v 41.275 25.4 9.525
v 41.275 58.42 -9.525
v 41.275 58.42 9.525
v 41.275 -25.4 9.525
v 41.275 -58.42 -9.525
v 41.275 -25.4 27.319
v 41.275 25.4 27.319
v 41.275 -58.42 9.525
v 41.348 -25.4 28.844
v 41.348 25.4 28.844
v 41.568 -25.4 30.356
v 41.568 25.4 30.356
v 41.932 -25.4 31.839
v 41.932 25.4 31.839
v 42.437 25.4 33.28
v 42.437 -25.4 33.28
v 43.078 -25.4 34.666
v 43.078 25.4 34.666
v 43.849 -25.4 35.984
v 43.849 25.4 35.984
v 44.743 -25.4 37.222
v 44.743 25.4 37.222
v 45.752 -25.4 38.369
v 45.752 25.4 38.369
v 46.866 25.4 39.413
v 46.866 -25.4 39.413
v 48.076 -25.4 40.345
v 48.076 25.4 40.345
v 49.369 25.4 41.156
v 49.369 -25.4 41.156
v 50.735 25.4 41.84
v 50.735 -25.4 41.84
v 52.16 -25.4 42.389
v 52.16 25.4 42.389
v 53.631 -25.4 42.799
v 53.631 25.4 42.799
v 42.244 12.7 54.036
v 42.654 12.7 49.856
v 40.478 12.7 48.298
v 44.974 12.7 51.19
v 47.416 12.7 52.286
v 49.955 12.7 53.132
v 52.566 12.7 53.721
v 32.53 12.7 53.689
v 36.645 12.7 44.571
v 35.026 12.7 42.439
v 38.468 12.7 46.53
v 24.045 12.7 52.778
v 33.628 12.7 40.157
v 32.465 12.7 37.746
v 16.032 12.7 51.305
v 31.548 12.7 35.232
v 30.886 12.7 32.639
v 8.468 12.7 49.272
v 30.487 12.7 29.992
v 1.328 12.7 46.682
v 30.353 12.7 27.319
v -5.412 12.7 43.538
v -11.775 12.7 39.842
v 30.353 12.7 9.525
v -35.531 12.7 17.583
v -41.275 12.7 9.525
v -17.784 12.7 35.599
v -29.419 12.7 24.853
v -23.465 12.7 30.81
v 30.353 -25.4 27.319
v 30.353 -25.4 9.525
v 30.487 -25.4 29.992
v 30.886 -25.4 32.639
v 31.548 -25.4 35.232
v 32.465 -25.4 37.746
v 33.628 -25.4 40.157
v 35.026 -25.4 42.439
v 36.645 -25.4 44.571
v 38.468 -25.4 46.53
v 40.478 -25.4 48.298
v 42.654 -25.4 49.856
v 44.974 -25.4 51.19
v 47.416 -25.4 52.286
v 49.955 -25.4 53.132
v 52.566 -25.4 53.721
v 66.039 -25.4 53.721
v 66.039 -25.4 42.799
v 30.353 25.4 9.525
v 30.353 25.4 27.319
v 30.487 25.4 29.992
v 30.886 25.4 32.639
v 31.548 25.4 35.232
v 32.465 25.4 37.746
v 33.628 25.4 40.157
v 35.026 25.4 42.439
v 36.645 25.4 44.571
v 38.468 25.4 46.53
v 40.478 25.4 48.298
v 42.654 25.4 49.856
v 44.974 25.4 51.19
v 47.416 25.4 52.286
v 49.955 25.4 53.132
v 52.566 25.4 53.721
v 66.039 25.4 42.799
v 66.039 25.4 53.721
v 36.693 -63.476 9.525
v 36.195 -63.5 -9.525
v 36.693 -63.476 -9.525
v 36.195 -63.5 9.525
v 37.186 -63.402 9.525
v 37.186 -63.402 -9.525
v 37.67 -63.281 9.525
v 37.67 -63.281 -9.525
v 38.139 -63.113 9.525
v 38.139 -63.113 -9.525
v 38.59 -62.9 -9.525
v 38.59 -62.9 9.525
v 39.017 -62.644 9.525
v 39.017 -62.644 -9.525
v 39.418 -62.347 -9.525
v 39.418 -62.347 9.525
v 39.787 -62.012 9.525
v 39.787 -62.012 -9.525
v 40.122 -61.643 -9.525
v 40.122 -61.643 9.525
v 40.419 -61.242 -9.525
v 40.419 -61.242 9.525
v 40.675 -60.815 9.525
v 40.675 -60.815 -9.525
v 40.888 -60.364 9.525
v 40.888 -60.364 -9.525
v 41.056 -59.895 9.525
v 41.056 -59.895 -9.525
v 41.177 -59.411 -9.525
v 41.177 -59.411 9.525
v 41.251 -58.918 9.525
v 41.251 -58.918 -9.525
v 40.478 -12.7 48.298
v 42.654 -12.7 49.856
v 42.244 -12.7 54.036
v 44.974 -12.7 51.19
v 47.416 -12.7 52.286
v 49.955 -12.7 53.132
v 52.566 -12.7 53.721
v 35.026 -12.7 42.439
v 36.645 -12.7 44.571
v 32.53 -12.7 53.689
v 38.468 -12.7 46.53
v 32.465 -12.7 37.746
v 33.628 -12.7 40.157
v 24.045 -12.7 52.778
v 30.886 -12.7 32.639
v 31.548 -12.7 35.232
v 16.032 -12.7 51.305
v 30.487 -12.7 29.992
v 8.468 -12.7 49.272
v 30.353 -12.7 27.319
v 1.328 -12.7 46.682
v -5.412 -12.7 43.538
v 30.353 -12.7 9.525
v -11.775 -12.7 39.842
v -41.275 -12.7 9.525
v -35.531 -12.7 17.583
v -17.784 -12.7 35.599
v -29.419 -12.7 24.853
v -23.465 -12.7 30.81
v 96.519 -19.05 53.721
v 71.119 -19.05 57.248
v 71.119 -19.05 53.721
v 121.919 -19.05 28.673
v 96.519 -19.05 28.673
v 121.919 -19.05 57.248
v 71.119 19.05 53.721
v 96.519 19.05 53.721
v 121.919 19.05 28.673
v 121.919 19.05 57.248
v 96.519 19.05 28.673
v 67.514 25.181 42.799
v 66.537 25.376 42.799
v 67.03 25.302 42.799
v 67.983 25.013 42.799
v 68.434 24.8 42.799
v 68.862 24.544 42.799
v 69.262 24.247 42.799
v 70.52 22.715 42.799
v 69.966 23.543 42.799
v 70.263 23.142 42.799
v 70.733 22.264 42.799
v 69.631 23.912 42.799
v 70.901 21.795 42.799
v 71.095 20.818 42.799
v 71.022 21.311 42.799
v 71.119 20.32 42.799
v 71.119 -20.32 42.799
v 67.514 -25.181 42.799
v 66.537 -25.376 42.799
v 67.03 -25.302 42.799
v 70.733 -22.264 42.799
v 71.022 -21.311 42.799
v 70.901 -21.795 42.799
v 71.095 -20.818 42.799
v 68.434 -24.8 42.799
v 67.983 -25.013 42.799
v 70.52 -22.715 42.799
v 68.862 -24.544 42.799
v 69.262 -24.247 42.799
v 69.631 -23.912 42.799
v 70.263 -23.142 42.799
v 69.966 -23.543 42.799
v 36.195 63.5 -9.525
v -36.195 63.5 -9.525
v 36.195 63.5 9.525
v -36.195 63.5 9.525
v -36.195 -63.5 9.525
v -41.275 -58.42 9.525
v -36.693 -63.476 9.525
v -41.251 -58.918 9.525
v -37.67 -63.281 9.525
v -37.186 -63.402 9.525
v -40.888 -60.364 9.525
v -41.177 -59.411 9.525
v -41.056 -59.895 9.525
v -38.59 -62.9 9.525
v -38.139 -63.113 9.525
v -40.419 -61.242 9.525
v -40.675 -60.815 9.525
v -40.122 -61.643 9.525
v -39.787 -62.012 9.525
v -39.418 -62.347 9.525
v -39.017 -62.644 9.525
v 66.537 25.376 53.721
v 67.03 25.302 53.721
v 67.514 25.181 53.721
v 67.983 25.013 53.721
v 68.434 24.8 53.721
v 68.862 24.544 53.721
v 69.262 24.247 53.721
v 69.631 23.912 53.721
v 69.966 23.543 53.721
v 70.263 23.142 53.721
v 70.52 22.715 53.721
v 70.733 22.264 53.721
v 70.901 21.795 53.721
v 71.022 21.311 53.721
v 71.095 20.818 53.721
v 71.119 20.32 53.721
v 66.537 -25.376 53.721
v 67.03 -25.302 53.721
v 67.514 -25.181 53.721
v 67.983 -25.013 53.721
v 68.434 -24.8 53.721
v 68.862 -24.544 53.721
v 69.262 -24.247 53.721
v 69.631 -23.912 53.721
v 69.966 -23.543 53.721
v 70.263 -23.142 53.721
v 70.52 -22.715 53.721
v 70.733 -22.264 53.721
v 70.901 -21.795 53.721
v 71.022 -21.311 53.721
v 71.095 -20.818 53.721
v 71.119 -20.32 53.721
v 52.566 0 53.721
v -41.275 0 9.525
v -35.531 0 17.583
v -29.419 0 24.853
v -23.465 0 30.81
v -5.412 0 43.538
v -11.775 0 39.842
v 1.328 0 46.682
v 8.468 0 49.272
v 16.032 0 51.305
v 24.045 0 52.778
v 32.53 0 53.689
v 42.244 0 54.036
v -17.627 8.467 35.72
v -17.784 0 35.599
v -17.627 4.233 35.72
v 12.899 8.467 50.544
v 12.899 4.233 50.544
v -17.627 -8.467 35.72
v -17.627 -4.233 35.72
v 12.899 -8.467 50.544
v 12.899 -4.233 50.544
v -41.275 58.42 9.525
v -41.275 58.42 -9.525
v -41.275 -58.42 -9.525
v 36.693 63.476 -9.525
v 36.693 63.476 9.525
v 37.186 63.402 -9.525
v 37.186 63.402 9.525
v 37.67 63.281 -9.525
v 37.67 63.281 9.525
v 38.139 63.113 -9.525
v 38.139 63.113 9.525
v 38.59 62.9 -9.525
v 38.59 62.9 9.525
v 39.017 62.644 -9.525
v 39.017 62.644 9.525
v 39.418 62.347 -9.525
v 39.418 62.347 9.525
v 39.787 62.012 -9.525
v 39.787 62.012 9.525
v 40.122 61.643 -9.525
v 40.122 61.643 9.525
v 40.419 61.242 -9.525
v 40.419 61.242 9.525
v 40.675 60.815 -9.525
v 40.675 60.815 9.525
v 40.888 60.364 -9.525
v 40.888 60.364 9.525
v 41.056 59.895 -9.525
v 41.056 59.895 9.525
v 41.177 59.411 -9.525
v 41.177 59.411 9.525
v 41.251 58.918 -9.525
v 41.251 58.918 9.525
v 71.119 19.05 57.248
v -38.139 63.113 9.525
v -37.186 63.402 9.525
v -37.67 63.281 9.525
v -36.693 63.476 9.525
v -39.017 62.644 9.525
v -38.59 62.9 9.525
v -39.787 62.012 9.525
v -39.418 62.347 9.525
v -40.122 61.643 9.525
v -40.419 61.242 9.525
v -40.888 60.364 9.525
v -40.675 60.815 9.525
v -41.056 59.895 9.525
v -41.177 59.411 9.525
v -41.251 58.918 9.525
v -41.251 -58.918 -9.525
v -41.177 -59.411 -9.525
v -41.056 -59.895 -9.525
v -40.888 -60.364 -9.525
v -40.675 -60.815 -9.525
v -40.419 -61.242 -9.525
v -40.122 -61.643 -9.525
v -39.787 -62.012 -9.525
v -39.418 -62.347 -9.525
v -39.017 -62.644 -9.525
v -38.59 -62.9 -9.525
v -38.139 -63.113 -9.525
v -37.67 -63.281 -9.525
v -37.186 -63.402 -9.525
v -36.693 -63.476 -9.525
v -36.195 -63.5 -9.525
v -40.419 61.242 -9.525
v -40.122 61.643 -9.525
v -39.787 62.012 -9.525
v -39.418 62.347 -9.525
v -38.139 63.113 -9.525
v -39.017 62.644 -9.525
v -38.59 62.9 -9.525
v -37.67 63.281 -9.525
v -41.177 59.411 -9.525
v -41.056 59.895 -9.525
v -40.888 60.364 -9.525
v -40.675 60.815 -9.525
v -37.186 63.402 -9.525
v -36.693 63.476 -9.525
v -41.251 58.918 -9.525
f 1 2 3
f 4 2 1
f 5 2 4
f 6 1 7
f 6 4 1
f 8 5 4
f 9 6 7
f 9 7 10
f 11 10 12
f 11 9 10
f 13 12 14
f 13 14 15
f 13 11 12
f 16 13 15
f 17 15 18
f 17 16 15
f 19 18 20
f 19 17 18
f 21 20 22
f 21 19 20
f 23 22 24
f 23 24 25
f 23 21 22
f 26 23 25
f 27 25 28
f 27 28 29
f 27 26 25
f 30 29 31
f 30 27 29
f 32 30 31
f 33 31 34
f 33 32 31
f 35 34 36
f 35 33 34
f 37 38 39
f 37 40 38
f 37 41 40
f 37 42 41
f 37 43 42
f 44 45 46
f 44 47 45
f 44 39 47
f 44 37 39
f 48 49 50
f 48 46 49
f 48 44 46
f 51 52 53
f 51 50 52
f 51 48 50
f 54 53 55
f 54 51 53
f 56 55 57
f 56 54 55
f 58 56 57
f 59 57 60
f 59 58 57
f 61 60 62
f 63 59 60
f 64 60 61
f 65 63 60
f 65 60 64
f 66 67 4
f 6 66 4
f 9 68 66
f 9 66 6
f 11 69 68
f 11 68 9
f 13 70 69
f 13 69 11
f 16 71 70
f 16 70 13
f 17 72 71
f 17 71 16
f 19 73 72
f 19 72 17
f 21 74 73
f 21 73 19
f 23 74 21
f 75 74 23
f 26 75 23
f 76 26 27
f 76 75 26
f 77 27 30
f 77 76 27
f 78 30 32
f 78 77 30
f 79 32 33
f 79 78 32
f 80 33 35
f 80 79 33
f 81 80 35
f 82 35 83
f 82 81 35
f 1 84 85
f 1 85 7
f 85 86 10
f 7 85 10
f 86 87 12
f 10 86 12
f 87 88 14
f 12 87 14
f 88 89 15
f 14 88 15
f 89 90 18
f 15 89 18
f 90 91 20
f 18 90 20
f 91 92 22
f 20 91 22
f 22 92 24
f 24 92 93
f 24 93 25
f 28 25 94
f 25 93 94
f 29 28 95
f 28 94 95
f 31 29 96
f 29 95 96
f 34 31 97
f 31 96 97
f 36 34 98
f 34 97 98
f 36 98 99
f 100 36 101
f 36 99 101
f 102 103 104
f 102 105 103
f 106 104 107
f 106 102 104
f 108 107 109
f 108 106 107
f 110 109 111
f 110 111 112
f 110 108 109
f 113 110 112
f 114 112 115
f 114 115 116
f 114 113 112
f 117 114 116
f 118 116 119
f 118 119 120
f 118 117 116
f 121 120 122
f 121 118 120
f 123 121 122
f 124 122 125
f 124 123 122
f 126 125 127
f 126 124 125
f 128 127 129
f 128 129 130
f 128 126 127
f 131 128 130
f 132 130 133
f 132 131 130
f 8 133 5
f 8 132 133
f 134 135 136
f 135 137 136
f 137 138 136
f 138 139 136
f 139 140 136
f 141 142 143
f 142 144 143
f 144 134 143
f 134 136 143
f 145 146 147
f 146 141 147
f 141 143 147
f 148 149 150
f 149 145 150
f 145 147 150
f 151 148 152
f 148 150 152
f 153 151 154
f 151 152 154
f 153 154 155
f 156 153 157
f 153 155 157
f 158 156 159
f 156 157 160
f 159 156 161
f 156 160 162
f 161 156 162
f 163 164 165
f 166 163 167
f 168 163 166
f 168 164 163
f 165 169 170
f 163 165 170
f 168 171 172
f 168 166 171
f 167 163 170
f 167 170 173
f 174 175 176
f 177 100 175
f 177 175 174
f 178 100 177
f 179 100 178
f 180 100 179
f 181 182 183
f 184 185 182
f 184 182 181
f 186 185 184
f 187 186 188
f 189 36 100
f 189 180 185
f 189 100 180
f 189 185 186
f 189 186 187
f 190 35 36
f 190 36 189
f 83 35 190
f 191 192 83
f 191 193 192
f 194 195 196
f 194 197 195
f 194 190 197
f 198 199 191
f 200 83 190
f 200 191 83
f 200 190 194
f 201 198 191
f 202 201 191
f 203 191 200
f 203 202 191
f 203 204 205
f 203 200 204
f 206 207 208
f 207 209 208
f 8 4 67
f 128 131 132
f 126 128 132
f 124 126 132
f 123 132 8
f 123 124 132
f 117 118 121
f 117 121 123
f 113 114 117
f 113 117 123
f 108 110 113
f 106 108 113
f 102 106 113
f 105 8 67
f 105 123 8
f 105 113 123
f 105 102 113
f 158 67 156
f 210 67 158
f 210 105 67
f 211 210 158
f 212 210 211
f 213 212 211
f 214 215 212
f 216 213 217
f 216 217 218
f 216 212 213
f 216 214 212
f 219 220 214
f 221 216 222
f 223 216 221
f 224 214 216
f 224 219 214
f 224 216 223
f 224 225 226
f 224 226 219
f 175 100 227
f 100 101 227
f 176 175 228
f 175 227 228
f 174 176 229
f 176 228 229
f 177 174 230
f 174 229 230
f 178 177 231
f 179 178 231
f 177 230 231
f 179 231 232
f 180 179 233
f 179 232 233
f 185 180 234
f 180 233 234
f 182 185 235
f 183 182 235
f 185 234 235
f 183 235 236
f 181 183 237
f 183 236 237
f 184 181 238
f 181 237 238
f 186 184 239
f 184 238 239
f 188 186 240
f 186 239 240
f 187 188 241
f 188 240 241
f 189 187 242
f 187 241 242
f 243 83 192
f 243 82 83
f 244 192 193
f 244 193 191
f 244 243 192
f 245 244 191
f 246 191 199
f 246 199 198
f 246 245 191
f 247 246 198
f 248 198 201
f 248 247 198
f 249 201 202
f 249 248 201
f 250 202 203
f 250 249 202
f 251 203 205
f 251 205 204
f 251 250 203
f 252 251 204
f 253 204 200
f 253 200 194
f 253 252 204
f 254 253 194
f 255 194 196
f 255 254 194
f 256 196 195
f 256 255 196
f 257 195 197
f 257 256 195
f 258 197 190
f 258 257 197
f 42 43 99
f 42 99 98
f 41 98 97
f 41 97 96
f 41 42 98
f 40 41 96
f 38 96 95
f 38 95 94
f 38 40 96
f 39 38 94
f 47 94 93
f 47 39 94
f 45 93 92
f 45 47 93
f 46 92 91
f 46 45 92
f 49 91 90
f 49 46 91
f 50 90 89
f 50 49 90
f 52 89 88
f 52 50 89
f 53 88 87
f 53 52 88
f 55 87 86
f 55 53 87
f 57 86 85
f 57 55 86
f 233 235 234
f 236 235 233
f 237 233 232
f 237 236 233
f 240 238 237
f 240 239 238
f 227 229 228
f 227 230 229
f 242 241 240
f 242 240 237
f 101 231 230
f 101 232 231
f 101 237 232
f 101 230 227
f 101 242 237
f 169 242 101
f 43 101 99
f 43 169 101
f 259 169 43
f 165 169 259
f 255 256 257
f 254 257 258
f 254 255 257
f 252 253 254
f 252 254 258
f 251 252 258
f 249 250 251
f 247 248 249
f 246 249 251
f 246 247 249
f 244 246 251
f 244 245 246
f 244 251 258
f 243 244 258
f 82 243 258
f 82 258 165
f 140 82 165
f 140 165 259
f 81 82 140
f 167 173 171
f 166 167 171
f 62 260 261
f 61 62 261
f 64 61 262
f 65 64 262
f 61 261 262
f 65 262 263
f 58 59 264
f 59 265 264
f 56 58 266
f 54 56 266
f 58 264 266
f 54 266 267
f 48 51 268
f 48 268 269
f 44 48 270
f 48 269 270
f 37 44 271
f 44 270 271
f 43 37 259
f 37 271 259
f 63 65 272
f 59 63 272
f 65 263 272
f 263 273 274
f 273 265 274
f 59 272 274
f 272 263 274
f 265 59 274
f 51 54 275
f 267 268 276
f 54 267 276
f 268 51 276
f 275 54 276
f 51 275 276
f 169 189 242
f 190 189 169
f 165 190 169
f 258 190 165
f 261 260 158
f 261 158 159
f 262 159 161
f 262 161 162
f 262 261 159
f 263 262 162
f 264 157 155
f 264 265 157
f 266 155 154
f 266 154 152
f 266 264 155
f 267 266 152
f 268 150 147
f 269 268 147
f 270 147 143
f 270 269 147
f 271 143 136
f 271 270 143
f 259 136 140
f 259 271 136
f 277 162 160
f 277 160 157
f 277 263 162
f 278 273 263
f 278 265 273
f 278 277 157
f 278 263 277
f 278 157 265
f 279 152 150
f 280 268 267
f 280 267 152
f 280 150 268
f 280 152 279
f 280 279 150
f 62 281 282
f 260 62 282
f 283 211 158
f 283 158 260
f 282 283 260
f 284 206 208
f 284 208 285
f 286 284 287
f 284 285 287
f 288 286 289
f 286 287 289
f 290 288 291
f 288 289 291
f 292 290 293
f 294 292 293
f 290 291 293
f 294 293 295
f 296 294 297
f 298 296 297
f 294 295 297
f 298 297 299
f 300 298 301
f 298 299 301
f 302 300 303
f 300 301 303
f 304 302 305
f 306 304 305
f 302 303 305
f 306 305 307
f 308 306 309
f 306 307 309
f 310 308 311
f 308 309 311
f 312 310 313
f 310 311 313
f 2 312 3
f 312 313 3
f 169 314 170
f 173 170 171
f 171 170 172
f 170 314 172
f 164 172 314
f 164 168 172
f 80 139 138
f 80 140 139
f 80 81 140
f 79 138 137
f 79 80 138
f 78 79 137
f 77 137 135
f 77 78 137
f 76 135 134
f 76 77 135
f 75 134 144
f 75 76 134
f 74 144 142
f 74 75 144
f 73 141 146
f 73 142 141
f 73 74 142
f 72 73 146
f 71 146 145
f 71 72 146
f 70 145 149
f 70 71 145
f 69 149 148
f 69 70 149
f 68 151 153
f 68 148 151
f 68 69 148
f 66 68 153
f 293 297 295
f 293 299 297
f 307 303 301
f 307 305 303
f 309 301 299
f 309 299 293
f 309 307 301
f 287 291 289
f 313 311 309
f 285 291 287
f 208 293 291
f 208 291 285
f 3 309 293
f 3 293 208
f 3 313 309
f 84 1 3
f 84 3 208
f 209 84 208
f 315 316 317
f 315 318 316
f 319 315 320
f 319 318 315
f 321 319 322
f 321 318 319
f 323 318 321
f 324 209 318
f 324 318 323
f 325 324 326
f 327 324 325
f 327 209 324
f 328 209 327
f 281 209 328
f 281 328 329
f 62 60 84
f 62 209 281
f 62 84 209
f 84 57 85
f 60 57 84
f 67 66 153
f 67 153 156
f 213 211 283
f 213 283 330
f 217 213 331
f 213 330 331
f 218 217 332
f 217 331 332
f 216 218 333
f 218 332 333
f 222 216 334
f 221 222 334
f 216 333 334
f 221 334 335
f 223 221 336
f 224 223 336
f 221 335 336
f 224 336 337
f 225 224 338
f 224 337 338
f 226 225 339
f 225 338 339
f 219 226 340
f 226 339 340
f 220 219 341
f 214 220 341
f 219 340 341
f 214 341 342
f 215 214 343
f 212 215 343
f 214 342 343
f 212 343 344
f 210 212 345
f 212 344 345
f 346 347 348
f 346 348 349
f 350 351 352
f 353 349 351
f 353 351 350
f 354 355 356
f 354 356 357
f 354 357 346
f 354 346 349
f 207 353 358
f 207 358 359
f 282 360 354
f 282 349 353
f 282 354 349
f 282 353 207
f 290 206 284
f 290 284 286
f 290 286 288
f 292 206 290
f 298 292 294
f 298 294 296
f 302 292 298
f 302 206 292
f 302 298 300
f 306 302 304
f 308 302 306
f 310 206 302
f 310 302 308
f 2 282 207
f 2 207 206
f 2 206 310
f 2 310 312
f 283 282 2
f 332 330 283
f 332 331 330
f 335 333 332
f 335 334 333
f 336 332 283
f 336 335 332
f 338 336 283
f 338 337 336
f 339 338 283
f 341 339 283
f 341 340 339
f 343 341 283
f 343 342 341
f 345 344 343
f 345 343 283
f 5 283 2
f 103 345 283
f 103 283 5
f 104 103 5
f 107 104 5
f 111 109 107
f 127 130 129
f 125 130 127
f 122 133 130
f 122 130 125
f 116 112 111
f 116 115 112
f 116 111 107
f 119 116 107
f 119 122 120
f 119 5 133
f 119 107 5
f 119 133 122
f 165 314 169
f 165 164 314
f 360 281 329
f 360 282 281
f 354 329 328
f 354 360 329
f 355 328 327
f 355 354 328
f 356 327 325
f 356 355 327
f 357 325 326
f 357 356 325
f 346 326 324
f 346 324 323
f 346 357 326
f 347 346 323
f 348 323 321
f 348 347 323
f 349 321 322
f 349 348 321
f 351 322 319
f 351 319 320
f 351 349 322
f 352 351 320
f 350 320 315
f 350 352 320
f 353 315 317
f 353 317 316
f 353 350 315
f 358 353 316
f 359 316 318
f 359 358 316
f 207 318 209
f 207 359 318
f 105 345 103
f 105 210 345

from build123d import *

# Parameters (mm, degrees)
F1_DEPTH = 63.5
F2_DEPTH = 25.4
F3_DEPTH = 12.7
F4_DEPTH = 19.05
F5_R     = 5.08


with BuildPart() as f1:
    # F0 (on Front) → F1 (new body, symmetric)
    with BuildSketch(Plane.XZ):
        Polygon((30.353, 9.525), (-41.275, 9.525), (-41.275, -9.525), (41.275, -9.525), (41.275, 9.525), align=None)
    extrude(amount=F1_DEPTH, both=True)

    # F0 (on Front) → F2 (join, symmetric)
    with BuildSketch(Plane.XZ):
        with BuildLine():
            Line((30.353, 27.3189590971), (30.353, 9.525))
            Line((30.353, 9.525), (41.275, 9.525))
            Line((41.275, 9.525), (41.275, 27.3189590971))
            ThreePointArc((41.275, 27.3189590971), (44.7427219335, 37.2222452174), (53.6309150841, 42.799))
            Line((53.6309150841, 42.799), (71.1193587124, 42.799))
            Line((71.1193587124, 42.799), (71.1193587124, 53.721))
            Line((71.1193587124, 53.721), (52.5661757055, 53.721))
            ThreePointArc((52.5661757055, 53.721), (36.6449768518, 44.5707194331), (30.353, 27.3189590971))
        make_face()
    extrude(amount=F2_DEPTH, both=True)

    # F0 (on Front) → F3 (join, symmetric)
    with BuildSketch(Plane.XZ):
        with BuildLine():
            add(Edge.make_bspline(
                [(-41.275, 9.525), (-20.312147215, 41.3128510118), (7.5740232132, 56.4608946443), (52.5661757055, 53.721)],
                knots=[0, 0, 0, 0, 103.727781591, 103.727781591, 103.727781591, 103.727781591], degree=3))
            Line((-41.275, 9.525), (30.353, 9.525))
            Line((30.353, 9.525), (30.353, 27.3189590971))
            ThreePointArc((30.353, 27.3189590971), (36.6449768518, 44.5707194331), (52.5661757055, 53.721))
        make_face()
    extrude(amount=F3_DEPTH, both=True)

    # F0 (on Front) → F4 (join, symmetric)
    with BuildSketch(Plane.XZ):
        Polygon((71.1193587124, 57.2476304275), (71.1193587124, 53.721), (83.4788307548, 53.721), (85.725, 53.721), (96.5193587124, 53.721), (96.5193587124, 57.2476304275), align=None)
        Polygon((121.9193587124, 57.2476304275), (96.5193587124, 57.2476304275), (96.5193587124, 53.721), (96.5193587124, 42.9601304275), (96.5193587124, 28.6726304275), (121.9193587124, 28.6726304275), align=None)
    extrude(amount=F4_DEPTH, both=True)

    # F5
    f5_edges = [f1.edges().sort_by_distance(p)[0] for p in [
        (-41.275, -63.5, 0),
        (41.275, -63.5, 0),
        (-41.275, 63.5, 0),
        (41.275, 63.5, 0),
        (71.119359, 25.4, 48.26),
        (71.119359, -25.4, 48.26),
    ]]
    fillet(f5_edges, radius=F5_R)


solid = f1.part
